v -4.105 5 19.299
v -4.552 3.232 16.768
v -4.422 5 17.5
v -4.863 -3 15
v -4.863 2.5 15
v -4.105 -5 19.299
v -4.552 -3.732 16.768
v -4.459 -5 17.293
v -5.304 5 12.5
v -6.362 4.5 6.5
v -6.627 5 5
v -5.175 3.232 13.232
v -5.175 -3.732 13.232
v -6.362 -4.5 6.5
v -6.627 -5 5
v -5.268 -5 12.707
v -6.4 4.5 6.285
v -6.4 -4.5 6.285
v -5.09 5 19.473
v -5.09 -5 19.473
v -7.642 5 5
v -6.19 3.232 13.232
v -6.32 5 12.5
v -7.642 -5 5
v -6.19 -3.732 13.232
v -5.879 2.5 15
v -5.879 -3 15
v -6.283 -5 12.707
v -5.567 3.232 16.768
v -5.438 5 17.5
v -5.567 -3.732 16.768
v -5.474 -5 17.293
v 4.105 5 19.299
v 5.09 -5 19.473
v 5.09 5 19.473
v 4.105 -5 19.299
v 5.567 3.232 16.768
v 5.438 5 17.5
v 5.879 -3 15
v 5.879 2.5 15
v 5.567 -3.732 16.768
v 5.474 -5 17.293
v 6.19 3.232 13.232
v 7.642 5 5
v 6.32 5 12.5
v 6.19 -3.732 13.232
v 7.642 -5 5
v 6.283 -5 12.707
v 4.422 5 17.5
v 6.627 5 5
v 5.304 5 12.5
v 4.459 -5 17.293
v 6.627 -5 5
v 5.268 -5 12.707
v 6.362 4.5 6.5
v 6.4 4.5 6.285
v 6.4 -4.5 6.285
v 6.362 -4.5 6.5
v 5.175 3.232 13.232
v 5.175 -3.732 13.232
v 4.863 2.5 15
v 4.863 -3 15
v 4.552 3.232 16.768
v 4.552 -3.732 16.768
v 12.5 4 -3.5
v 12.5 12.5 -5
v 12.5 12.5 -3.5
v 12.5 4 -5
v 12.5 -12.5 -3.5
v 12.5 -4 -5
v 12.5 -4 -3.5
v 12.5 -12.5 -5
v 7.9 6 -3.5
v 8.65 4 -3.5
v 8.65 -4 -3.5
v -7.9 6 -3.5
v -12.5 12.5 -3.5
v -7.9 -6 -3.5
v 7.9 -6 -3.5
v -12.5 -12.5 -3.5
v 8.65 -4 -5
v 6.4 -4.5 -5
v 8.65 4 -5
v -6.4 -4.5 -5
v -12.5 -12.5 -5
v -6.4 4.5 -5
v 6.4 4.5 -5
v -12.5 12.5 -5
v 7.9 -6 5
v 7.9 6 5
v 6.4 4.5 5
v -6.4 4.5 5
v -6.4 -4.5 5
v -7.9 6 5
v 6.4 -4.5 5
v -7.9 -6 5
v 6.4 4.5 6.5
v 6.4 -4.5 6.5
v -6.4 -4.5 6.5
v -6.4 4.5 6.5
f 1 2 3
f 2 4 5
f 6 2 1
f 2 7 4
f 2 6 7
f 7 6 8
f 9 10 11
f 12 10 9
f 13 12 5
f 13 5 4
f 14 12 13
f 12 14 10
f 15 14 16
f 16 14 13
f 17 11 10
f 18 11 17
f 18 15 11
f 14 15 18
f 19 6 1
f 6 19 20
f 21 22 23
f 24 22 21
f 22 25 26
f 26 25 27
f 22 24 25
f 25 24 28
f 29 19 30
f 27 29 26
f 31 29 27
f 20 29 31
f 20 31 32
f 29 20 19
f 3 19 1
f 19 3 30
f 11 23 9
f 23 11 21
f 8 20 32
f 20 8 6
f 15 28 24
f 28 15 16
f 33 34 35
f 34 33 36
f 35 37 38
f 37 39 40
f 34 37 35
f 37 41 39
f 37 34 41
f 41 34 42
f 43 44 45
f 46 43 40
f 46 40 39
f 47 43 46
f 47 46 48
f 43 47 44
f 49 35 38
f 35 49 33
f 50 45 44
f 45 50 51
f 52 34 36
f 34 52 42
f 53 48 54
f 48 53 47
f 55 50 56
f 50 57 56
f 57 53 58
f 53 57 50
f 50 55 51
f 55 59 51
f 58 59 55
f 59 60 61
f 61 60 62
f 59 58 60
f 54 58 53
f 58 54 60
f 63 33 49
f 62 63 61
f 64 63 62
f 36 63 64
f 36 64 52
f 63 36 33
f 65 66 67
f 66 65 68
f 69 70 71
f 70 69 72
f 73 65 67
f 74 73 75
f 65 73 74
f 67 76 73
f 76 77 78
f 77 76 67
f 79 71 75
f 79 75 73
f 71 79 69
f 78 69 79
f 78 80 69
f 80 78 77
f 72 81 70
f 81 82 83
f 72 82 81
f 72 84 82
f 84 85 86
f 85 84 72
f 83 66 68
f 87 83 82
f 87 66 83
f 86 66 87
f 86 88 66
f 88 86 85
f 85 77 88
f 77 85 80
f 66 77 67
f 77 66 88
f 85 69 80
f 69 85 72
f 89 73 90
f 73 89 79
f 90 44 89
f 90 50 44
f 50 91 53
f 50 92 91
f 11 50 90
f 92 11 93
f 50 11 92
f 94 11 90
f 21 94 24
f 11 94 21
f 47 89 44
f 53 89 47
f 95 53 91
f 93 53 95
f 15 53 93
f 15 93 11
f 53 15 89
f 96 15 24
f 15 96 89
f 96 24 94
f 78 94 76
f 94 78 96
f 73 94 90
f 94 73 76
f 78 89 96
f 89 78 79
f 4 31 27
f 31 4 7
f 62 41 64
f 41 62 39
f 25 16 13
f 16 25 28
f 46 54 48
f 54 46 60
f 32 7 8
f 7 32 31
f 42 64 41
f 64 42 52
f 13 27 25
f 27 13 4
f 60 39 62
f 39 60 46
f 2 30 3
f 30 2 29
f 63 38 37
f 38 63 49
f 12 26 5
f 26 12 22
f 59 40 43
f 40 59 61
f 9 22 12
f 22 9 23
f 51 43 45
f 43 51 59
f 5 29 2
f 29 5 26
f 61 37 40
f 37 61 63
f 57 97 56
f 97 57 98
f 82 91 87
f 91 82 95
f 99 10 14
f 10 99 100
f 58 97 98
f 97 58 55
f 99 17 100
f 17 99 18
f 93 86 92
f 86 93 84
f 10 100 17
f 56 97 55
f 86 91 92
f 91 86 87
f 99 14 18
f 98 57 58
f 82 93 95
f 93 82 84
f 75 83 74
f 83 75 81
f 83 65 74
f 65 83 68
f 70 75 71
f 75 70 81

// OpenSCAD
/* [Cable Tip Measurements] */
// Max width of USB cable end 
CableTipWidth = 10.8; // [5:0.1:100]
// Max height of USB cable end 
CableTipHeight = 8; // [5:0.1:100]
//Adds slot for micro SD card if printer is a Creality CR-10
IsPrinterCrealityCR10 = 1;// [1:Yes,0:No]

/* [Protector Geometry] */
//How tight should the cable end fit?
clearance = 1; // [.5:Tight,1:Medium,2:Loose]
//Wall Thickness
wallThickness = 1.5; // [1.2:0.1:3.2]

/* [Hidden] */
//Angle to tilt the squeeze tabs inward
tabTiltInAngle = 10;// [0:0.1:20]
//Height of the squeeze tabs
tabHeight = 15;// [5:50]
//Size of the square that is glued to the side
glueSurfaceSideSize = 25; // [20:5:140]

tabThickness = wallThickness-clearance/2;

CableProtector();

module CableProtector(){
    difference(){
        union(){
            //Glue surface
            translate([0,0,-4.25])
                cube([glueSurfaceSideSize,glueSurfaceSideSize, 1.5], center=true);

            //Main body
            cube([CableTipWidth+2*(wallThickness+clearance),CableTipHeight+2*wallThickness+clearance,10], center=true);

            //Tabs for zip-ties or rubber band
            x = (CableTipWidth+clearance/2 + sin(tabTiltInAngle * tabHeight))/2;
            for(angle=[0,180])
                translate([angle==0?-x:x,0,12])
                    rotate([0,0,angle])
                        rotate([0,tabTiltInAngle,0]) 
                            cube([1,10, 15], center=true);
        }
        //Hole for tip
        cube([CableTipWidth+2*clearance,CableTipHeight+clearance,13], center=true);

        //Zip-Tie notches
        if (tabHeight>5)
            for(y=[-5.5,5])
                translate([0,y,tabHeight])
                    rotate([0,90,0])
                        cylinder(r=2.5, h=CableTipWidth+2*(wallThickness+clearance), center=true, fn=10);

        //Creality CR-10 Micro-SD card slot
        if (IsPrinterCrealityCR10>0)
            translate([CableTipWidth/2+clearance+wallThickness*1.5,-4,-4.25-wallThickness])
                cube([glueSurfaceSideSize/3, 8, 2*wallThickness]);
    }
}
